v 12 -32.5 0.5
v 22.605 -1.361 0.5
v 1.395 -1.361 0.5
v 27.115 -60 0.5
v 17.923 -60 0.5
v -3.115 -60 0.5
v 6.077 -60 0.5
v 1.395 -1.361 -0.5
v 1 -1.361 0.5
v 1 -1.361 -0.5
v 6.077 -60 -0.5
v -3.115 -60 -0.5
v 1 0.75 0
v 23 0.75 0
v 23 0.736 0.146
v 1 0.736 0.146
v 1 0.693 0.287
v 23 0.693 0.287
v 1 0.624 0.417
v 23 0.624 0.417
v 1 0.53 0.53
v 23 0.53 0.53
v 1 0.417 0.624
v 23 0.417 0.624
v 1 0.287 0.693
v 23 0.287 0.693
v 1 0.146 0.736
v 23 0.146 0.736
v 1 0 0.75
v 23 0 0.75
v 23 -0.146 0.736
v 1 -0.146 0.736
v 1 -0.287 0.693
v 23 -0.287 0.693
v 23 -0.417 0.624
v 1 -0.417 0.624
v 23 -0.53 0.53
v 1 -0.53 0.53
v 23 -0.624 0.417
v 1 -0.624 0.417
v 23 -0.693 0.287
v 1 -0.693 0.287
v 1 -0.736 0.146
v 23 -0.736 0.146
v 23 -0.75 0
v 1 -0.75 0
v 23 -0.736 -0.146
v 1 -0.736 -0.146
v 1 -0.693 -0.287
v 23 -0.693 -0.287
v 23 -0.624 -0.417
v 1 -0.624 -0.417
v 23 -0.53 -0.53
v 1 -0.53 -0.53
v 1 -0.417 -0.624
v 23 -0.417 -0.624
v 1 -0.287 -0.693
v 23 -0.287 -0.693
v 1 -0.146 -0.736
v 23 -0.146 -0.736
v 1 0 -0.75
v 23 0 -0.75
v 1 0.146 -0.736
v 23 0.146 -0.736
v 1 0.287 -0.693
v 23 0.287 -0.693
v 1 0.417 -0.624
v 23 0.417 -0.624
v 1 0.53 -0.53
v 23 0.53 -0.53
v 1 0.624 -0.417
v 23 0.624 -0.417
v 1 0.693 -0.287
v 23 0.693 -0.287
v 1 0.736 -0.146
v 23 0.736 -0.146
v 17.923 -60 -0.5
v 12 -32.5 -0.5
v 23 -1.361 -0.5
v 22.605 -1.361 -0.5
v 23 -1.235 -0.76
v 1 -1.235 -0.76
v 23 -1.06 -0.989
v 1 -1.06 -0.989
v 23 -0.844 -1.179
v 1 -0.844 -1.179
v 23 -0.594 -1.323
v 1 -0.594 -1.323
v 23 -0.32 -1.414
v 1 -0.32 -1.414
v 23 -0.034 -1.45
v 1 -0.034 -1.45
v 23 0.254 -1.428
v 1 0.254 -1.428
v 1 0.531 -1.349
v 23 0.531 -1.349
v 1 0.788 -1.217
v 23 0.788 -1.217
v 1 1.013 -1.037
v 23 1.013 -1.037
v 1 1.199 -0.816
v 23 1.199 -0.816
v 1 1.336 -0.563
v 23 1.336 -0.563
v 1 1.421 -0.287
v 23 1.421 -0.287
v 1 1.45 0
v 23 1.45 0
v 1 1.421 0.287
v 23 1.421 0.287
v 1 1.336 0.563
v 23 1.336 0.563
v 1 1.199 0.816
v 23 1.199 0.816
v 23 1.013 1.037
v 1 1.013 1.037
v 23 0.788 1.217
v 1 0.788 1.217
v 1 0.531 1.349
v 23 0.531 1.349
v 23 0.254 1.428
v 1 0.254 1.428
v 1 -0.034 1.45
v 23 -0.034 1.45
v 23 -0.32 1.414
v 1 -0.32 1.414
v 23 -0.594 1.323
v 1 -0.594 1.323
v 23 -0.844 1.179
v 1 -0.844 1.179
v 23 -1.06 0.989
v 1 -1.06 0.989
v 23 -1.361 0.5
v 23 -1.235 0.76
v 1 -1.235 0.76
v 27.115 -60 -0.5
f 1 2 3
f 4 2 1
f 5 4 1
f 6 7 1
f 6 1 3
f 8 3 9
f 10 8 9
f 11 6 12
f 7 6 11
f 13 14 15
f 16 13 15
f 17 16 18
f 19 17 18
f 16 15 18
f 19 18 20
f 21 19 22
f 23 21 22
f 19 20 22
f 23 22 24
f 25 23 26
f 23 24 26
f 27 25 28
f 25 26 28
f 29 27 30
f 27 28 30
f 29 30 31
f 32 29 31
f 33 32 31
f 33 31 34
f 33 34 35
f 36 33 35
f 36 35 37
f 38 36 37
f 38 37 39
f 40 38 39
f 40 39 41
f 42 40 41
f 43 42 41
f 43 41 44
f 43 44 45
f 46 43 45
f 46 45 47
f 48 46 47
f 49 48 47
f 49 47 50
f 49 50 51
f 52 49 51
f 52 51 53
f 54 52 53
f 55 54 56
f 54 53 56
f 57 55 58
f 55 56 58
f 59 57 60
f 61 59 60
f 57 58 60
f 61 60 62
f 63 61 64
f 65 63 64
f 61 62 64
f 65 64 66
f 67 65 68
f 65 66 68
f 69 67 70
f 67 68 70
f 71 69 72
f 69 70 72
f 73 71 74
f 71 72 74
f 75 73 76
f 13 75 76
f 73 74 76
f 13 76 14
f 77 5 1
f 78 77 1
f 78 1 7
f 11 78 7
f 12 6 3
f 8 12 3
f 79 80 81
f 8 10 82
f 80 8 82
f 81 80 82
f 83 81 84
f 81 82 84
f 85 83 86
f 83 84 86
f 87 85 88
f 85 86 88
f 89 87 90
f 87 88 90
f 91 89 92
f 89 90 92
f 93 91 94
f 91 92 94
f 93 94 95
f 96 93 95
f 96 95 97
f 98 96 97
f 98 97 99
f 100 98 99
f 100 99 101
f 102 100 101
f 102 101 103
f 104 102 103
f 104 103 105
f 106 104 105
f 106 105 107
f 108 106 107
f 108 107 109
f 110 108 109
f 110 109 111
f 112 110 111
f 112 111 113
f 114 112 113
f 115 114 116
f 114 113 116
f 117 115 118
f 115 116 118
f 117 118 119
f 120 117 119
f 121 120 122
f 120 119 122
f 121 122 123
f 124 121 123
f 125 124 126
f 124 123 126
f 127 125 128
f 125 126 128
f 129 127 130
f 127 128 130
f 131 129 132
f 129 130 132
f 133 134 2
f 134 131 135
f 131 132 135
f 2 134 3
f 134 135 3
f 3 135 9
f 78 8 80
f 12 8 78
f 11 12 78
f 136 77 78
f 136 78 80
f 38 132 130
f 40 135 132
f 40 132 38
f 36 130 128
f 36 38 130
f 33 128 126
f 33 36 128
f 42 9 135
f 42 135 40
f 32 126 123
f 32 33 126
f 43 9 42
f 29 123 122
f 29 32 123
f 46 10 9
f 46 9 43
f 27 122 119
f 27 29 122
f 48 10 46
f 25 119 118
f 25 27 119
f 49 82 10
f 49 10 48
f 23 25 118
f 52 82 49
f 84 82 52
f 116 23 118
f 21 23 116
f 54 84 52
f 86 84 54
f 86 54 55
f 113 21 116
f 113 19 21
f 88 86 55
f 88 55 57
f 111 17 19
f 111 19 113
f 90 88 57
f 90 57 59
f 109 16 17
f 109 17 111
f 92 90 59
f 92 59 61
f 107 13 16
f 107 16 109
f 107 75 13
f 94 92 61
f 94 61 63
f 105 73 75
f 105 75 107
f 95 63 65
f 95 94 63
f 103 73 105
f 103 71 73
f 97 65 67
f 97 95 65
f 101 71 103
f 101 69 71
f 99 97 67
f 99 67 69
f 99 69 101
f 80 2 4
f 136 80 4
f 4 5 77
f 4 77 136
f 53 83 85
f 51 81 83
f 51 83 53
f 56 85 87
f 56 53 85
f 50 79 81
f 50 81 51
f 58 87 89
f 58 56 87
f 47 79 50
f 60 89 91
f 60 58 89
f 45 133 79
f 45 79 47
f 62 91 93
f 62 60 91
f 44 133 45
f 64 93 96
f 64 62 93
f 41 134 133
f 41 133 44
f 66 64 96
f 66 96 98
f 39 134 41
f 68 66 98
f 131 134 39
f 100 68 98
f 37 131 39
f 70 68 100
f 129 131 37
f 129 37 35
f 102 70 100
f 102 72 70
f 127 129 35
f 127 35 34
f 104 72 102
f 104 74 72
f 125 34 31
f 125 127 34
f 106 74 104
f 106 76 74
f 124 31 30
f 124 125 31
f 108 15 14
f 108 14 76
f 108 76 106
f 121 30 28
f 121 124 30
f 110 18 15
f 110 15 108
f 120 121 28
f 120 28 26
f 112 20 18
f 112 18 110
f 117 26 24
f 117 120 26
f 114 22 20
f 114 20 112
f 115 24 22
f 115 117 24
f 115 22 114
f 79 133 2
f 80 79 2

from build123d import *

# Parameters (mm, degrees)
F0_R      = 1.45
F1_DEPTH  = 24
F5_DEPTH  = 65
F7_DEPTH  = 25
F8_W      = 31
F8_H      = 5
F9_DEPTH  = 25
F10_R     = 0.75
F11_DEPTH = 40
F12_W     = 1
F12_H     = 2.9
F12_H_2   = 3.020188
F13_DEPTH = 12.5


with BuildPart() as f1:
    # F0 (on Right) → F1 (new body)
    with BuildSketch(Plane.YZ):
        Circle(F0_R)
    extrude(amount=F1_DEPTH)

    # F4 (on offset) → F5 (join)
    with BuildSketch(Plane.XZ.offset(65)):
        Polygon((22.5, 0.5), (1.5, 0.5), (-3.5, 0.5), (-3.5, -0.5), (1.5, -0.5), (22.5, -0.5), (27.5, -0.5), (27.5, 0.5), align=None)
    extrude(amount=-F5_DEPTH)

    # F6 (on face) → F7 (cut)
    with BuildSketch(Plane.XY.offset(0.5)):
        Polygon((27.5, -65), (27.5, 0), (24, 0), (24, -1.361066), (22.604697, -1.361066), align=None)
        Polygon((0, 0), (-3.5, 0), (-3.5, -65), (1.395303, -1.361066), (0, -1.361066), align=None)
        Polygon((5, -65), (12, -65), (19, -65), (12, -32.5), align=None)
    extrude(amount=-F7_DEPTH, mode=Mode.SUBTRACT)

    # F8 (on face) → F9 (cut)
    with BuildSketch(Plane.XY.offset(0.5)):
        with Locations((12, -62.5)):
            Rectangle(F8_W, F8_H)
    extrude(amount=-F9_DEPTH, mode=Mode.SUBTRACT)

    # F10 (on face) → F11 (cut)
    with BuildSketch(Plane.YZ.offset(24)):
        Circle(F10_R)
    extrude(amount=-F11_DEPTH, mode=Mode.SUBTRACT)

    # F12 (on Top) → F13 (cut, symmetric)
    with BuildSketch(Plane.XY):
        with Locations((0.5, 0)):
            Rectangle(F12_W, F12_H)
        with Locations((23.5, -0.060094)):
            Rectangle(F12_W, F12_H_2)
    extrude(amount=F13_DEPTH, both=True, mode=Mode.SUBTRACT)


solid = f1.part
